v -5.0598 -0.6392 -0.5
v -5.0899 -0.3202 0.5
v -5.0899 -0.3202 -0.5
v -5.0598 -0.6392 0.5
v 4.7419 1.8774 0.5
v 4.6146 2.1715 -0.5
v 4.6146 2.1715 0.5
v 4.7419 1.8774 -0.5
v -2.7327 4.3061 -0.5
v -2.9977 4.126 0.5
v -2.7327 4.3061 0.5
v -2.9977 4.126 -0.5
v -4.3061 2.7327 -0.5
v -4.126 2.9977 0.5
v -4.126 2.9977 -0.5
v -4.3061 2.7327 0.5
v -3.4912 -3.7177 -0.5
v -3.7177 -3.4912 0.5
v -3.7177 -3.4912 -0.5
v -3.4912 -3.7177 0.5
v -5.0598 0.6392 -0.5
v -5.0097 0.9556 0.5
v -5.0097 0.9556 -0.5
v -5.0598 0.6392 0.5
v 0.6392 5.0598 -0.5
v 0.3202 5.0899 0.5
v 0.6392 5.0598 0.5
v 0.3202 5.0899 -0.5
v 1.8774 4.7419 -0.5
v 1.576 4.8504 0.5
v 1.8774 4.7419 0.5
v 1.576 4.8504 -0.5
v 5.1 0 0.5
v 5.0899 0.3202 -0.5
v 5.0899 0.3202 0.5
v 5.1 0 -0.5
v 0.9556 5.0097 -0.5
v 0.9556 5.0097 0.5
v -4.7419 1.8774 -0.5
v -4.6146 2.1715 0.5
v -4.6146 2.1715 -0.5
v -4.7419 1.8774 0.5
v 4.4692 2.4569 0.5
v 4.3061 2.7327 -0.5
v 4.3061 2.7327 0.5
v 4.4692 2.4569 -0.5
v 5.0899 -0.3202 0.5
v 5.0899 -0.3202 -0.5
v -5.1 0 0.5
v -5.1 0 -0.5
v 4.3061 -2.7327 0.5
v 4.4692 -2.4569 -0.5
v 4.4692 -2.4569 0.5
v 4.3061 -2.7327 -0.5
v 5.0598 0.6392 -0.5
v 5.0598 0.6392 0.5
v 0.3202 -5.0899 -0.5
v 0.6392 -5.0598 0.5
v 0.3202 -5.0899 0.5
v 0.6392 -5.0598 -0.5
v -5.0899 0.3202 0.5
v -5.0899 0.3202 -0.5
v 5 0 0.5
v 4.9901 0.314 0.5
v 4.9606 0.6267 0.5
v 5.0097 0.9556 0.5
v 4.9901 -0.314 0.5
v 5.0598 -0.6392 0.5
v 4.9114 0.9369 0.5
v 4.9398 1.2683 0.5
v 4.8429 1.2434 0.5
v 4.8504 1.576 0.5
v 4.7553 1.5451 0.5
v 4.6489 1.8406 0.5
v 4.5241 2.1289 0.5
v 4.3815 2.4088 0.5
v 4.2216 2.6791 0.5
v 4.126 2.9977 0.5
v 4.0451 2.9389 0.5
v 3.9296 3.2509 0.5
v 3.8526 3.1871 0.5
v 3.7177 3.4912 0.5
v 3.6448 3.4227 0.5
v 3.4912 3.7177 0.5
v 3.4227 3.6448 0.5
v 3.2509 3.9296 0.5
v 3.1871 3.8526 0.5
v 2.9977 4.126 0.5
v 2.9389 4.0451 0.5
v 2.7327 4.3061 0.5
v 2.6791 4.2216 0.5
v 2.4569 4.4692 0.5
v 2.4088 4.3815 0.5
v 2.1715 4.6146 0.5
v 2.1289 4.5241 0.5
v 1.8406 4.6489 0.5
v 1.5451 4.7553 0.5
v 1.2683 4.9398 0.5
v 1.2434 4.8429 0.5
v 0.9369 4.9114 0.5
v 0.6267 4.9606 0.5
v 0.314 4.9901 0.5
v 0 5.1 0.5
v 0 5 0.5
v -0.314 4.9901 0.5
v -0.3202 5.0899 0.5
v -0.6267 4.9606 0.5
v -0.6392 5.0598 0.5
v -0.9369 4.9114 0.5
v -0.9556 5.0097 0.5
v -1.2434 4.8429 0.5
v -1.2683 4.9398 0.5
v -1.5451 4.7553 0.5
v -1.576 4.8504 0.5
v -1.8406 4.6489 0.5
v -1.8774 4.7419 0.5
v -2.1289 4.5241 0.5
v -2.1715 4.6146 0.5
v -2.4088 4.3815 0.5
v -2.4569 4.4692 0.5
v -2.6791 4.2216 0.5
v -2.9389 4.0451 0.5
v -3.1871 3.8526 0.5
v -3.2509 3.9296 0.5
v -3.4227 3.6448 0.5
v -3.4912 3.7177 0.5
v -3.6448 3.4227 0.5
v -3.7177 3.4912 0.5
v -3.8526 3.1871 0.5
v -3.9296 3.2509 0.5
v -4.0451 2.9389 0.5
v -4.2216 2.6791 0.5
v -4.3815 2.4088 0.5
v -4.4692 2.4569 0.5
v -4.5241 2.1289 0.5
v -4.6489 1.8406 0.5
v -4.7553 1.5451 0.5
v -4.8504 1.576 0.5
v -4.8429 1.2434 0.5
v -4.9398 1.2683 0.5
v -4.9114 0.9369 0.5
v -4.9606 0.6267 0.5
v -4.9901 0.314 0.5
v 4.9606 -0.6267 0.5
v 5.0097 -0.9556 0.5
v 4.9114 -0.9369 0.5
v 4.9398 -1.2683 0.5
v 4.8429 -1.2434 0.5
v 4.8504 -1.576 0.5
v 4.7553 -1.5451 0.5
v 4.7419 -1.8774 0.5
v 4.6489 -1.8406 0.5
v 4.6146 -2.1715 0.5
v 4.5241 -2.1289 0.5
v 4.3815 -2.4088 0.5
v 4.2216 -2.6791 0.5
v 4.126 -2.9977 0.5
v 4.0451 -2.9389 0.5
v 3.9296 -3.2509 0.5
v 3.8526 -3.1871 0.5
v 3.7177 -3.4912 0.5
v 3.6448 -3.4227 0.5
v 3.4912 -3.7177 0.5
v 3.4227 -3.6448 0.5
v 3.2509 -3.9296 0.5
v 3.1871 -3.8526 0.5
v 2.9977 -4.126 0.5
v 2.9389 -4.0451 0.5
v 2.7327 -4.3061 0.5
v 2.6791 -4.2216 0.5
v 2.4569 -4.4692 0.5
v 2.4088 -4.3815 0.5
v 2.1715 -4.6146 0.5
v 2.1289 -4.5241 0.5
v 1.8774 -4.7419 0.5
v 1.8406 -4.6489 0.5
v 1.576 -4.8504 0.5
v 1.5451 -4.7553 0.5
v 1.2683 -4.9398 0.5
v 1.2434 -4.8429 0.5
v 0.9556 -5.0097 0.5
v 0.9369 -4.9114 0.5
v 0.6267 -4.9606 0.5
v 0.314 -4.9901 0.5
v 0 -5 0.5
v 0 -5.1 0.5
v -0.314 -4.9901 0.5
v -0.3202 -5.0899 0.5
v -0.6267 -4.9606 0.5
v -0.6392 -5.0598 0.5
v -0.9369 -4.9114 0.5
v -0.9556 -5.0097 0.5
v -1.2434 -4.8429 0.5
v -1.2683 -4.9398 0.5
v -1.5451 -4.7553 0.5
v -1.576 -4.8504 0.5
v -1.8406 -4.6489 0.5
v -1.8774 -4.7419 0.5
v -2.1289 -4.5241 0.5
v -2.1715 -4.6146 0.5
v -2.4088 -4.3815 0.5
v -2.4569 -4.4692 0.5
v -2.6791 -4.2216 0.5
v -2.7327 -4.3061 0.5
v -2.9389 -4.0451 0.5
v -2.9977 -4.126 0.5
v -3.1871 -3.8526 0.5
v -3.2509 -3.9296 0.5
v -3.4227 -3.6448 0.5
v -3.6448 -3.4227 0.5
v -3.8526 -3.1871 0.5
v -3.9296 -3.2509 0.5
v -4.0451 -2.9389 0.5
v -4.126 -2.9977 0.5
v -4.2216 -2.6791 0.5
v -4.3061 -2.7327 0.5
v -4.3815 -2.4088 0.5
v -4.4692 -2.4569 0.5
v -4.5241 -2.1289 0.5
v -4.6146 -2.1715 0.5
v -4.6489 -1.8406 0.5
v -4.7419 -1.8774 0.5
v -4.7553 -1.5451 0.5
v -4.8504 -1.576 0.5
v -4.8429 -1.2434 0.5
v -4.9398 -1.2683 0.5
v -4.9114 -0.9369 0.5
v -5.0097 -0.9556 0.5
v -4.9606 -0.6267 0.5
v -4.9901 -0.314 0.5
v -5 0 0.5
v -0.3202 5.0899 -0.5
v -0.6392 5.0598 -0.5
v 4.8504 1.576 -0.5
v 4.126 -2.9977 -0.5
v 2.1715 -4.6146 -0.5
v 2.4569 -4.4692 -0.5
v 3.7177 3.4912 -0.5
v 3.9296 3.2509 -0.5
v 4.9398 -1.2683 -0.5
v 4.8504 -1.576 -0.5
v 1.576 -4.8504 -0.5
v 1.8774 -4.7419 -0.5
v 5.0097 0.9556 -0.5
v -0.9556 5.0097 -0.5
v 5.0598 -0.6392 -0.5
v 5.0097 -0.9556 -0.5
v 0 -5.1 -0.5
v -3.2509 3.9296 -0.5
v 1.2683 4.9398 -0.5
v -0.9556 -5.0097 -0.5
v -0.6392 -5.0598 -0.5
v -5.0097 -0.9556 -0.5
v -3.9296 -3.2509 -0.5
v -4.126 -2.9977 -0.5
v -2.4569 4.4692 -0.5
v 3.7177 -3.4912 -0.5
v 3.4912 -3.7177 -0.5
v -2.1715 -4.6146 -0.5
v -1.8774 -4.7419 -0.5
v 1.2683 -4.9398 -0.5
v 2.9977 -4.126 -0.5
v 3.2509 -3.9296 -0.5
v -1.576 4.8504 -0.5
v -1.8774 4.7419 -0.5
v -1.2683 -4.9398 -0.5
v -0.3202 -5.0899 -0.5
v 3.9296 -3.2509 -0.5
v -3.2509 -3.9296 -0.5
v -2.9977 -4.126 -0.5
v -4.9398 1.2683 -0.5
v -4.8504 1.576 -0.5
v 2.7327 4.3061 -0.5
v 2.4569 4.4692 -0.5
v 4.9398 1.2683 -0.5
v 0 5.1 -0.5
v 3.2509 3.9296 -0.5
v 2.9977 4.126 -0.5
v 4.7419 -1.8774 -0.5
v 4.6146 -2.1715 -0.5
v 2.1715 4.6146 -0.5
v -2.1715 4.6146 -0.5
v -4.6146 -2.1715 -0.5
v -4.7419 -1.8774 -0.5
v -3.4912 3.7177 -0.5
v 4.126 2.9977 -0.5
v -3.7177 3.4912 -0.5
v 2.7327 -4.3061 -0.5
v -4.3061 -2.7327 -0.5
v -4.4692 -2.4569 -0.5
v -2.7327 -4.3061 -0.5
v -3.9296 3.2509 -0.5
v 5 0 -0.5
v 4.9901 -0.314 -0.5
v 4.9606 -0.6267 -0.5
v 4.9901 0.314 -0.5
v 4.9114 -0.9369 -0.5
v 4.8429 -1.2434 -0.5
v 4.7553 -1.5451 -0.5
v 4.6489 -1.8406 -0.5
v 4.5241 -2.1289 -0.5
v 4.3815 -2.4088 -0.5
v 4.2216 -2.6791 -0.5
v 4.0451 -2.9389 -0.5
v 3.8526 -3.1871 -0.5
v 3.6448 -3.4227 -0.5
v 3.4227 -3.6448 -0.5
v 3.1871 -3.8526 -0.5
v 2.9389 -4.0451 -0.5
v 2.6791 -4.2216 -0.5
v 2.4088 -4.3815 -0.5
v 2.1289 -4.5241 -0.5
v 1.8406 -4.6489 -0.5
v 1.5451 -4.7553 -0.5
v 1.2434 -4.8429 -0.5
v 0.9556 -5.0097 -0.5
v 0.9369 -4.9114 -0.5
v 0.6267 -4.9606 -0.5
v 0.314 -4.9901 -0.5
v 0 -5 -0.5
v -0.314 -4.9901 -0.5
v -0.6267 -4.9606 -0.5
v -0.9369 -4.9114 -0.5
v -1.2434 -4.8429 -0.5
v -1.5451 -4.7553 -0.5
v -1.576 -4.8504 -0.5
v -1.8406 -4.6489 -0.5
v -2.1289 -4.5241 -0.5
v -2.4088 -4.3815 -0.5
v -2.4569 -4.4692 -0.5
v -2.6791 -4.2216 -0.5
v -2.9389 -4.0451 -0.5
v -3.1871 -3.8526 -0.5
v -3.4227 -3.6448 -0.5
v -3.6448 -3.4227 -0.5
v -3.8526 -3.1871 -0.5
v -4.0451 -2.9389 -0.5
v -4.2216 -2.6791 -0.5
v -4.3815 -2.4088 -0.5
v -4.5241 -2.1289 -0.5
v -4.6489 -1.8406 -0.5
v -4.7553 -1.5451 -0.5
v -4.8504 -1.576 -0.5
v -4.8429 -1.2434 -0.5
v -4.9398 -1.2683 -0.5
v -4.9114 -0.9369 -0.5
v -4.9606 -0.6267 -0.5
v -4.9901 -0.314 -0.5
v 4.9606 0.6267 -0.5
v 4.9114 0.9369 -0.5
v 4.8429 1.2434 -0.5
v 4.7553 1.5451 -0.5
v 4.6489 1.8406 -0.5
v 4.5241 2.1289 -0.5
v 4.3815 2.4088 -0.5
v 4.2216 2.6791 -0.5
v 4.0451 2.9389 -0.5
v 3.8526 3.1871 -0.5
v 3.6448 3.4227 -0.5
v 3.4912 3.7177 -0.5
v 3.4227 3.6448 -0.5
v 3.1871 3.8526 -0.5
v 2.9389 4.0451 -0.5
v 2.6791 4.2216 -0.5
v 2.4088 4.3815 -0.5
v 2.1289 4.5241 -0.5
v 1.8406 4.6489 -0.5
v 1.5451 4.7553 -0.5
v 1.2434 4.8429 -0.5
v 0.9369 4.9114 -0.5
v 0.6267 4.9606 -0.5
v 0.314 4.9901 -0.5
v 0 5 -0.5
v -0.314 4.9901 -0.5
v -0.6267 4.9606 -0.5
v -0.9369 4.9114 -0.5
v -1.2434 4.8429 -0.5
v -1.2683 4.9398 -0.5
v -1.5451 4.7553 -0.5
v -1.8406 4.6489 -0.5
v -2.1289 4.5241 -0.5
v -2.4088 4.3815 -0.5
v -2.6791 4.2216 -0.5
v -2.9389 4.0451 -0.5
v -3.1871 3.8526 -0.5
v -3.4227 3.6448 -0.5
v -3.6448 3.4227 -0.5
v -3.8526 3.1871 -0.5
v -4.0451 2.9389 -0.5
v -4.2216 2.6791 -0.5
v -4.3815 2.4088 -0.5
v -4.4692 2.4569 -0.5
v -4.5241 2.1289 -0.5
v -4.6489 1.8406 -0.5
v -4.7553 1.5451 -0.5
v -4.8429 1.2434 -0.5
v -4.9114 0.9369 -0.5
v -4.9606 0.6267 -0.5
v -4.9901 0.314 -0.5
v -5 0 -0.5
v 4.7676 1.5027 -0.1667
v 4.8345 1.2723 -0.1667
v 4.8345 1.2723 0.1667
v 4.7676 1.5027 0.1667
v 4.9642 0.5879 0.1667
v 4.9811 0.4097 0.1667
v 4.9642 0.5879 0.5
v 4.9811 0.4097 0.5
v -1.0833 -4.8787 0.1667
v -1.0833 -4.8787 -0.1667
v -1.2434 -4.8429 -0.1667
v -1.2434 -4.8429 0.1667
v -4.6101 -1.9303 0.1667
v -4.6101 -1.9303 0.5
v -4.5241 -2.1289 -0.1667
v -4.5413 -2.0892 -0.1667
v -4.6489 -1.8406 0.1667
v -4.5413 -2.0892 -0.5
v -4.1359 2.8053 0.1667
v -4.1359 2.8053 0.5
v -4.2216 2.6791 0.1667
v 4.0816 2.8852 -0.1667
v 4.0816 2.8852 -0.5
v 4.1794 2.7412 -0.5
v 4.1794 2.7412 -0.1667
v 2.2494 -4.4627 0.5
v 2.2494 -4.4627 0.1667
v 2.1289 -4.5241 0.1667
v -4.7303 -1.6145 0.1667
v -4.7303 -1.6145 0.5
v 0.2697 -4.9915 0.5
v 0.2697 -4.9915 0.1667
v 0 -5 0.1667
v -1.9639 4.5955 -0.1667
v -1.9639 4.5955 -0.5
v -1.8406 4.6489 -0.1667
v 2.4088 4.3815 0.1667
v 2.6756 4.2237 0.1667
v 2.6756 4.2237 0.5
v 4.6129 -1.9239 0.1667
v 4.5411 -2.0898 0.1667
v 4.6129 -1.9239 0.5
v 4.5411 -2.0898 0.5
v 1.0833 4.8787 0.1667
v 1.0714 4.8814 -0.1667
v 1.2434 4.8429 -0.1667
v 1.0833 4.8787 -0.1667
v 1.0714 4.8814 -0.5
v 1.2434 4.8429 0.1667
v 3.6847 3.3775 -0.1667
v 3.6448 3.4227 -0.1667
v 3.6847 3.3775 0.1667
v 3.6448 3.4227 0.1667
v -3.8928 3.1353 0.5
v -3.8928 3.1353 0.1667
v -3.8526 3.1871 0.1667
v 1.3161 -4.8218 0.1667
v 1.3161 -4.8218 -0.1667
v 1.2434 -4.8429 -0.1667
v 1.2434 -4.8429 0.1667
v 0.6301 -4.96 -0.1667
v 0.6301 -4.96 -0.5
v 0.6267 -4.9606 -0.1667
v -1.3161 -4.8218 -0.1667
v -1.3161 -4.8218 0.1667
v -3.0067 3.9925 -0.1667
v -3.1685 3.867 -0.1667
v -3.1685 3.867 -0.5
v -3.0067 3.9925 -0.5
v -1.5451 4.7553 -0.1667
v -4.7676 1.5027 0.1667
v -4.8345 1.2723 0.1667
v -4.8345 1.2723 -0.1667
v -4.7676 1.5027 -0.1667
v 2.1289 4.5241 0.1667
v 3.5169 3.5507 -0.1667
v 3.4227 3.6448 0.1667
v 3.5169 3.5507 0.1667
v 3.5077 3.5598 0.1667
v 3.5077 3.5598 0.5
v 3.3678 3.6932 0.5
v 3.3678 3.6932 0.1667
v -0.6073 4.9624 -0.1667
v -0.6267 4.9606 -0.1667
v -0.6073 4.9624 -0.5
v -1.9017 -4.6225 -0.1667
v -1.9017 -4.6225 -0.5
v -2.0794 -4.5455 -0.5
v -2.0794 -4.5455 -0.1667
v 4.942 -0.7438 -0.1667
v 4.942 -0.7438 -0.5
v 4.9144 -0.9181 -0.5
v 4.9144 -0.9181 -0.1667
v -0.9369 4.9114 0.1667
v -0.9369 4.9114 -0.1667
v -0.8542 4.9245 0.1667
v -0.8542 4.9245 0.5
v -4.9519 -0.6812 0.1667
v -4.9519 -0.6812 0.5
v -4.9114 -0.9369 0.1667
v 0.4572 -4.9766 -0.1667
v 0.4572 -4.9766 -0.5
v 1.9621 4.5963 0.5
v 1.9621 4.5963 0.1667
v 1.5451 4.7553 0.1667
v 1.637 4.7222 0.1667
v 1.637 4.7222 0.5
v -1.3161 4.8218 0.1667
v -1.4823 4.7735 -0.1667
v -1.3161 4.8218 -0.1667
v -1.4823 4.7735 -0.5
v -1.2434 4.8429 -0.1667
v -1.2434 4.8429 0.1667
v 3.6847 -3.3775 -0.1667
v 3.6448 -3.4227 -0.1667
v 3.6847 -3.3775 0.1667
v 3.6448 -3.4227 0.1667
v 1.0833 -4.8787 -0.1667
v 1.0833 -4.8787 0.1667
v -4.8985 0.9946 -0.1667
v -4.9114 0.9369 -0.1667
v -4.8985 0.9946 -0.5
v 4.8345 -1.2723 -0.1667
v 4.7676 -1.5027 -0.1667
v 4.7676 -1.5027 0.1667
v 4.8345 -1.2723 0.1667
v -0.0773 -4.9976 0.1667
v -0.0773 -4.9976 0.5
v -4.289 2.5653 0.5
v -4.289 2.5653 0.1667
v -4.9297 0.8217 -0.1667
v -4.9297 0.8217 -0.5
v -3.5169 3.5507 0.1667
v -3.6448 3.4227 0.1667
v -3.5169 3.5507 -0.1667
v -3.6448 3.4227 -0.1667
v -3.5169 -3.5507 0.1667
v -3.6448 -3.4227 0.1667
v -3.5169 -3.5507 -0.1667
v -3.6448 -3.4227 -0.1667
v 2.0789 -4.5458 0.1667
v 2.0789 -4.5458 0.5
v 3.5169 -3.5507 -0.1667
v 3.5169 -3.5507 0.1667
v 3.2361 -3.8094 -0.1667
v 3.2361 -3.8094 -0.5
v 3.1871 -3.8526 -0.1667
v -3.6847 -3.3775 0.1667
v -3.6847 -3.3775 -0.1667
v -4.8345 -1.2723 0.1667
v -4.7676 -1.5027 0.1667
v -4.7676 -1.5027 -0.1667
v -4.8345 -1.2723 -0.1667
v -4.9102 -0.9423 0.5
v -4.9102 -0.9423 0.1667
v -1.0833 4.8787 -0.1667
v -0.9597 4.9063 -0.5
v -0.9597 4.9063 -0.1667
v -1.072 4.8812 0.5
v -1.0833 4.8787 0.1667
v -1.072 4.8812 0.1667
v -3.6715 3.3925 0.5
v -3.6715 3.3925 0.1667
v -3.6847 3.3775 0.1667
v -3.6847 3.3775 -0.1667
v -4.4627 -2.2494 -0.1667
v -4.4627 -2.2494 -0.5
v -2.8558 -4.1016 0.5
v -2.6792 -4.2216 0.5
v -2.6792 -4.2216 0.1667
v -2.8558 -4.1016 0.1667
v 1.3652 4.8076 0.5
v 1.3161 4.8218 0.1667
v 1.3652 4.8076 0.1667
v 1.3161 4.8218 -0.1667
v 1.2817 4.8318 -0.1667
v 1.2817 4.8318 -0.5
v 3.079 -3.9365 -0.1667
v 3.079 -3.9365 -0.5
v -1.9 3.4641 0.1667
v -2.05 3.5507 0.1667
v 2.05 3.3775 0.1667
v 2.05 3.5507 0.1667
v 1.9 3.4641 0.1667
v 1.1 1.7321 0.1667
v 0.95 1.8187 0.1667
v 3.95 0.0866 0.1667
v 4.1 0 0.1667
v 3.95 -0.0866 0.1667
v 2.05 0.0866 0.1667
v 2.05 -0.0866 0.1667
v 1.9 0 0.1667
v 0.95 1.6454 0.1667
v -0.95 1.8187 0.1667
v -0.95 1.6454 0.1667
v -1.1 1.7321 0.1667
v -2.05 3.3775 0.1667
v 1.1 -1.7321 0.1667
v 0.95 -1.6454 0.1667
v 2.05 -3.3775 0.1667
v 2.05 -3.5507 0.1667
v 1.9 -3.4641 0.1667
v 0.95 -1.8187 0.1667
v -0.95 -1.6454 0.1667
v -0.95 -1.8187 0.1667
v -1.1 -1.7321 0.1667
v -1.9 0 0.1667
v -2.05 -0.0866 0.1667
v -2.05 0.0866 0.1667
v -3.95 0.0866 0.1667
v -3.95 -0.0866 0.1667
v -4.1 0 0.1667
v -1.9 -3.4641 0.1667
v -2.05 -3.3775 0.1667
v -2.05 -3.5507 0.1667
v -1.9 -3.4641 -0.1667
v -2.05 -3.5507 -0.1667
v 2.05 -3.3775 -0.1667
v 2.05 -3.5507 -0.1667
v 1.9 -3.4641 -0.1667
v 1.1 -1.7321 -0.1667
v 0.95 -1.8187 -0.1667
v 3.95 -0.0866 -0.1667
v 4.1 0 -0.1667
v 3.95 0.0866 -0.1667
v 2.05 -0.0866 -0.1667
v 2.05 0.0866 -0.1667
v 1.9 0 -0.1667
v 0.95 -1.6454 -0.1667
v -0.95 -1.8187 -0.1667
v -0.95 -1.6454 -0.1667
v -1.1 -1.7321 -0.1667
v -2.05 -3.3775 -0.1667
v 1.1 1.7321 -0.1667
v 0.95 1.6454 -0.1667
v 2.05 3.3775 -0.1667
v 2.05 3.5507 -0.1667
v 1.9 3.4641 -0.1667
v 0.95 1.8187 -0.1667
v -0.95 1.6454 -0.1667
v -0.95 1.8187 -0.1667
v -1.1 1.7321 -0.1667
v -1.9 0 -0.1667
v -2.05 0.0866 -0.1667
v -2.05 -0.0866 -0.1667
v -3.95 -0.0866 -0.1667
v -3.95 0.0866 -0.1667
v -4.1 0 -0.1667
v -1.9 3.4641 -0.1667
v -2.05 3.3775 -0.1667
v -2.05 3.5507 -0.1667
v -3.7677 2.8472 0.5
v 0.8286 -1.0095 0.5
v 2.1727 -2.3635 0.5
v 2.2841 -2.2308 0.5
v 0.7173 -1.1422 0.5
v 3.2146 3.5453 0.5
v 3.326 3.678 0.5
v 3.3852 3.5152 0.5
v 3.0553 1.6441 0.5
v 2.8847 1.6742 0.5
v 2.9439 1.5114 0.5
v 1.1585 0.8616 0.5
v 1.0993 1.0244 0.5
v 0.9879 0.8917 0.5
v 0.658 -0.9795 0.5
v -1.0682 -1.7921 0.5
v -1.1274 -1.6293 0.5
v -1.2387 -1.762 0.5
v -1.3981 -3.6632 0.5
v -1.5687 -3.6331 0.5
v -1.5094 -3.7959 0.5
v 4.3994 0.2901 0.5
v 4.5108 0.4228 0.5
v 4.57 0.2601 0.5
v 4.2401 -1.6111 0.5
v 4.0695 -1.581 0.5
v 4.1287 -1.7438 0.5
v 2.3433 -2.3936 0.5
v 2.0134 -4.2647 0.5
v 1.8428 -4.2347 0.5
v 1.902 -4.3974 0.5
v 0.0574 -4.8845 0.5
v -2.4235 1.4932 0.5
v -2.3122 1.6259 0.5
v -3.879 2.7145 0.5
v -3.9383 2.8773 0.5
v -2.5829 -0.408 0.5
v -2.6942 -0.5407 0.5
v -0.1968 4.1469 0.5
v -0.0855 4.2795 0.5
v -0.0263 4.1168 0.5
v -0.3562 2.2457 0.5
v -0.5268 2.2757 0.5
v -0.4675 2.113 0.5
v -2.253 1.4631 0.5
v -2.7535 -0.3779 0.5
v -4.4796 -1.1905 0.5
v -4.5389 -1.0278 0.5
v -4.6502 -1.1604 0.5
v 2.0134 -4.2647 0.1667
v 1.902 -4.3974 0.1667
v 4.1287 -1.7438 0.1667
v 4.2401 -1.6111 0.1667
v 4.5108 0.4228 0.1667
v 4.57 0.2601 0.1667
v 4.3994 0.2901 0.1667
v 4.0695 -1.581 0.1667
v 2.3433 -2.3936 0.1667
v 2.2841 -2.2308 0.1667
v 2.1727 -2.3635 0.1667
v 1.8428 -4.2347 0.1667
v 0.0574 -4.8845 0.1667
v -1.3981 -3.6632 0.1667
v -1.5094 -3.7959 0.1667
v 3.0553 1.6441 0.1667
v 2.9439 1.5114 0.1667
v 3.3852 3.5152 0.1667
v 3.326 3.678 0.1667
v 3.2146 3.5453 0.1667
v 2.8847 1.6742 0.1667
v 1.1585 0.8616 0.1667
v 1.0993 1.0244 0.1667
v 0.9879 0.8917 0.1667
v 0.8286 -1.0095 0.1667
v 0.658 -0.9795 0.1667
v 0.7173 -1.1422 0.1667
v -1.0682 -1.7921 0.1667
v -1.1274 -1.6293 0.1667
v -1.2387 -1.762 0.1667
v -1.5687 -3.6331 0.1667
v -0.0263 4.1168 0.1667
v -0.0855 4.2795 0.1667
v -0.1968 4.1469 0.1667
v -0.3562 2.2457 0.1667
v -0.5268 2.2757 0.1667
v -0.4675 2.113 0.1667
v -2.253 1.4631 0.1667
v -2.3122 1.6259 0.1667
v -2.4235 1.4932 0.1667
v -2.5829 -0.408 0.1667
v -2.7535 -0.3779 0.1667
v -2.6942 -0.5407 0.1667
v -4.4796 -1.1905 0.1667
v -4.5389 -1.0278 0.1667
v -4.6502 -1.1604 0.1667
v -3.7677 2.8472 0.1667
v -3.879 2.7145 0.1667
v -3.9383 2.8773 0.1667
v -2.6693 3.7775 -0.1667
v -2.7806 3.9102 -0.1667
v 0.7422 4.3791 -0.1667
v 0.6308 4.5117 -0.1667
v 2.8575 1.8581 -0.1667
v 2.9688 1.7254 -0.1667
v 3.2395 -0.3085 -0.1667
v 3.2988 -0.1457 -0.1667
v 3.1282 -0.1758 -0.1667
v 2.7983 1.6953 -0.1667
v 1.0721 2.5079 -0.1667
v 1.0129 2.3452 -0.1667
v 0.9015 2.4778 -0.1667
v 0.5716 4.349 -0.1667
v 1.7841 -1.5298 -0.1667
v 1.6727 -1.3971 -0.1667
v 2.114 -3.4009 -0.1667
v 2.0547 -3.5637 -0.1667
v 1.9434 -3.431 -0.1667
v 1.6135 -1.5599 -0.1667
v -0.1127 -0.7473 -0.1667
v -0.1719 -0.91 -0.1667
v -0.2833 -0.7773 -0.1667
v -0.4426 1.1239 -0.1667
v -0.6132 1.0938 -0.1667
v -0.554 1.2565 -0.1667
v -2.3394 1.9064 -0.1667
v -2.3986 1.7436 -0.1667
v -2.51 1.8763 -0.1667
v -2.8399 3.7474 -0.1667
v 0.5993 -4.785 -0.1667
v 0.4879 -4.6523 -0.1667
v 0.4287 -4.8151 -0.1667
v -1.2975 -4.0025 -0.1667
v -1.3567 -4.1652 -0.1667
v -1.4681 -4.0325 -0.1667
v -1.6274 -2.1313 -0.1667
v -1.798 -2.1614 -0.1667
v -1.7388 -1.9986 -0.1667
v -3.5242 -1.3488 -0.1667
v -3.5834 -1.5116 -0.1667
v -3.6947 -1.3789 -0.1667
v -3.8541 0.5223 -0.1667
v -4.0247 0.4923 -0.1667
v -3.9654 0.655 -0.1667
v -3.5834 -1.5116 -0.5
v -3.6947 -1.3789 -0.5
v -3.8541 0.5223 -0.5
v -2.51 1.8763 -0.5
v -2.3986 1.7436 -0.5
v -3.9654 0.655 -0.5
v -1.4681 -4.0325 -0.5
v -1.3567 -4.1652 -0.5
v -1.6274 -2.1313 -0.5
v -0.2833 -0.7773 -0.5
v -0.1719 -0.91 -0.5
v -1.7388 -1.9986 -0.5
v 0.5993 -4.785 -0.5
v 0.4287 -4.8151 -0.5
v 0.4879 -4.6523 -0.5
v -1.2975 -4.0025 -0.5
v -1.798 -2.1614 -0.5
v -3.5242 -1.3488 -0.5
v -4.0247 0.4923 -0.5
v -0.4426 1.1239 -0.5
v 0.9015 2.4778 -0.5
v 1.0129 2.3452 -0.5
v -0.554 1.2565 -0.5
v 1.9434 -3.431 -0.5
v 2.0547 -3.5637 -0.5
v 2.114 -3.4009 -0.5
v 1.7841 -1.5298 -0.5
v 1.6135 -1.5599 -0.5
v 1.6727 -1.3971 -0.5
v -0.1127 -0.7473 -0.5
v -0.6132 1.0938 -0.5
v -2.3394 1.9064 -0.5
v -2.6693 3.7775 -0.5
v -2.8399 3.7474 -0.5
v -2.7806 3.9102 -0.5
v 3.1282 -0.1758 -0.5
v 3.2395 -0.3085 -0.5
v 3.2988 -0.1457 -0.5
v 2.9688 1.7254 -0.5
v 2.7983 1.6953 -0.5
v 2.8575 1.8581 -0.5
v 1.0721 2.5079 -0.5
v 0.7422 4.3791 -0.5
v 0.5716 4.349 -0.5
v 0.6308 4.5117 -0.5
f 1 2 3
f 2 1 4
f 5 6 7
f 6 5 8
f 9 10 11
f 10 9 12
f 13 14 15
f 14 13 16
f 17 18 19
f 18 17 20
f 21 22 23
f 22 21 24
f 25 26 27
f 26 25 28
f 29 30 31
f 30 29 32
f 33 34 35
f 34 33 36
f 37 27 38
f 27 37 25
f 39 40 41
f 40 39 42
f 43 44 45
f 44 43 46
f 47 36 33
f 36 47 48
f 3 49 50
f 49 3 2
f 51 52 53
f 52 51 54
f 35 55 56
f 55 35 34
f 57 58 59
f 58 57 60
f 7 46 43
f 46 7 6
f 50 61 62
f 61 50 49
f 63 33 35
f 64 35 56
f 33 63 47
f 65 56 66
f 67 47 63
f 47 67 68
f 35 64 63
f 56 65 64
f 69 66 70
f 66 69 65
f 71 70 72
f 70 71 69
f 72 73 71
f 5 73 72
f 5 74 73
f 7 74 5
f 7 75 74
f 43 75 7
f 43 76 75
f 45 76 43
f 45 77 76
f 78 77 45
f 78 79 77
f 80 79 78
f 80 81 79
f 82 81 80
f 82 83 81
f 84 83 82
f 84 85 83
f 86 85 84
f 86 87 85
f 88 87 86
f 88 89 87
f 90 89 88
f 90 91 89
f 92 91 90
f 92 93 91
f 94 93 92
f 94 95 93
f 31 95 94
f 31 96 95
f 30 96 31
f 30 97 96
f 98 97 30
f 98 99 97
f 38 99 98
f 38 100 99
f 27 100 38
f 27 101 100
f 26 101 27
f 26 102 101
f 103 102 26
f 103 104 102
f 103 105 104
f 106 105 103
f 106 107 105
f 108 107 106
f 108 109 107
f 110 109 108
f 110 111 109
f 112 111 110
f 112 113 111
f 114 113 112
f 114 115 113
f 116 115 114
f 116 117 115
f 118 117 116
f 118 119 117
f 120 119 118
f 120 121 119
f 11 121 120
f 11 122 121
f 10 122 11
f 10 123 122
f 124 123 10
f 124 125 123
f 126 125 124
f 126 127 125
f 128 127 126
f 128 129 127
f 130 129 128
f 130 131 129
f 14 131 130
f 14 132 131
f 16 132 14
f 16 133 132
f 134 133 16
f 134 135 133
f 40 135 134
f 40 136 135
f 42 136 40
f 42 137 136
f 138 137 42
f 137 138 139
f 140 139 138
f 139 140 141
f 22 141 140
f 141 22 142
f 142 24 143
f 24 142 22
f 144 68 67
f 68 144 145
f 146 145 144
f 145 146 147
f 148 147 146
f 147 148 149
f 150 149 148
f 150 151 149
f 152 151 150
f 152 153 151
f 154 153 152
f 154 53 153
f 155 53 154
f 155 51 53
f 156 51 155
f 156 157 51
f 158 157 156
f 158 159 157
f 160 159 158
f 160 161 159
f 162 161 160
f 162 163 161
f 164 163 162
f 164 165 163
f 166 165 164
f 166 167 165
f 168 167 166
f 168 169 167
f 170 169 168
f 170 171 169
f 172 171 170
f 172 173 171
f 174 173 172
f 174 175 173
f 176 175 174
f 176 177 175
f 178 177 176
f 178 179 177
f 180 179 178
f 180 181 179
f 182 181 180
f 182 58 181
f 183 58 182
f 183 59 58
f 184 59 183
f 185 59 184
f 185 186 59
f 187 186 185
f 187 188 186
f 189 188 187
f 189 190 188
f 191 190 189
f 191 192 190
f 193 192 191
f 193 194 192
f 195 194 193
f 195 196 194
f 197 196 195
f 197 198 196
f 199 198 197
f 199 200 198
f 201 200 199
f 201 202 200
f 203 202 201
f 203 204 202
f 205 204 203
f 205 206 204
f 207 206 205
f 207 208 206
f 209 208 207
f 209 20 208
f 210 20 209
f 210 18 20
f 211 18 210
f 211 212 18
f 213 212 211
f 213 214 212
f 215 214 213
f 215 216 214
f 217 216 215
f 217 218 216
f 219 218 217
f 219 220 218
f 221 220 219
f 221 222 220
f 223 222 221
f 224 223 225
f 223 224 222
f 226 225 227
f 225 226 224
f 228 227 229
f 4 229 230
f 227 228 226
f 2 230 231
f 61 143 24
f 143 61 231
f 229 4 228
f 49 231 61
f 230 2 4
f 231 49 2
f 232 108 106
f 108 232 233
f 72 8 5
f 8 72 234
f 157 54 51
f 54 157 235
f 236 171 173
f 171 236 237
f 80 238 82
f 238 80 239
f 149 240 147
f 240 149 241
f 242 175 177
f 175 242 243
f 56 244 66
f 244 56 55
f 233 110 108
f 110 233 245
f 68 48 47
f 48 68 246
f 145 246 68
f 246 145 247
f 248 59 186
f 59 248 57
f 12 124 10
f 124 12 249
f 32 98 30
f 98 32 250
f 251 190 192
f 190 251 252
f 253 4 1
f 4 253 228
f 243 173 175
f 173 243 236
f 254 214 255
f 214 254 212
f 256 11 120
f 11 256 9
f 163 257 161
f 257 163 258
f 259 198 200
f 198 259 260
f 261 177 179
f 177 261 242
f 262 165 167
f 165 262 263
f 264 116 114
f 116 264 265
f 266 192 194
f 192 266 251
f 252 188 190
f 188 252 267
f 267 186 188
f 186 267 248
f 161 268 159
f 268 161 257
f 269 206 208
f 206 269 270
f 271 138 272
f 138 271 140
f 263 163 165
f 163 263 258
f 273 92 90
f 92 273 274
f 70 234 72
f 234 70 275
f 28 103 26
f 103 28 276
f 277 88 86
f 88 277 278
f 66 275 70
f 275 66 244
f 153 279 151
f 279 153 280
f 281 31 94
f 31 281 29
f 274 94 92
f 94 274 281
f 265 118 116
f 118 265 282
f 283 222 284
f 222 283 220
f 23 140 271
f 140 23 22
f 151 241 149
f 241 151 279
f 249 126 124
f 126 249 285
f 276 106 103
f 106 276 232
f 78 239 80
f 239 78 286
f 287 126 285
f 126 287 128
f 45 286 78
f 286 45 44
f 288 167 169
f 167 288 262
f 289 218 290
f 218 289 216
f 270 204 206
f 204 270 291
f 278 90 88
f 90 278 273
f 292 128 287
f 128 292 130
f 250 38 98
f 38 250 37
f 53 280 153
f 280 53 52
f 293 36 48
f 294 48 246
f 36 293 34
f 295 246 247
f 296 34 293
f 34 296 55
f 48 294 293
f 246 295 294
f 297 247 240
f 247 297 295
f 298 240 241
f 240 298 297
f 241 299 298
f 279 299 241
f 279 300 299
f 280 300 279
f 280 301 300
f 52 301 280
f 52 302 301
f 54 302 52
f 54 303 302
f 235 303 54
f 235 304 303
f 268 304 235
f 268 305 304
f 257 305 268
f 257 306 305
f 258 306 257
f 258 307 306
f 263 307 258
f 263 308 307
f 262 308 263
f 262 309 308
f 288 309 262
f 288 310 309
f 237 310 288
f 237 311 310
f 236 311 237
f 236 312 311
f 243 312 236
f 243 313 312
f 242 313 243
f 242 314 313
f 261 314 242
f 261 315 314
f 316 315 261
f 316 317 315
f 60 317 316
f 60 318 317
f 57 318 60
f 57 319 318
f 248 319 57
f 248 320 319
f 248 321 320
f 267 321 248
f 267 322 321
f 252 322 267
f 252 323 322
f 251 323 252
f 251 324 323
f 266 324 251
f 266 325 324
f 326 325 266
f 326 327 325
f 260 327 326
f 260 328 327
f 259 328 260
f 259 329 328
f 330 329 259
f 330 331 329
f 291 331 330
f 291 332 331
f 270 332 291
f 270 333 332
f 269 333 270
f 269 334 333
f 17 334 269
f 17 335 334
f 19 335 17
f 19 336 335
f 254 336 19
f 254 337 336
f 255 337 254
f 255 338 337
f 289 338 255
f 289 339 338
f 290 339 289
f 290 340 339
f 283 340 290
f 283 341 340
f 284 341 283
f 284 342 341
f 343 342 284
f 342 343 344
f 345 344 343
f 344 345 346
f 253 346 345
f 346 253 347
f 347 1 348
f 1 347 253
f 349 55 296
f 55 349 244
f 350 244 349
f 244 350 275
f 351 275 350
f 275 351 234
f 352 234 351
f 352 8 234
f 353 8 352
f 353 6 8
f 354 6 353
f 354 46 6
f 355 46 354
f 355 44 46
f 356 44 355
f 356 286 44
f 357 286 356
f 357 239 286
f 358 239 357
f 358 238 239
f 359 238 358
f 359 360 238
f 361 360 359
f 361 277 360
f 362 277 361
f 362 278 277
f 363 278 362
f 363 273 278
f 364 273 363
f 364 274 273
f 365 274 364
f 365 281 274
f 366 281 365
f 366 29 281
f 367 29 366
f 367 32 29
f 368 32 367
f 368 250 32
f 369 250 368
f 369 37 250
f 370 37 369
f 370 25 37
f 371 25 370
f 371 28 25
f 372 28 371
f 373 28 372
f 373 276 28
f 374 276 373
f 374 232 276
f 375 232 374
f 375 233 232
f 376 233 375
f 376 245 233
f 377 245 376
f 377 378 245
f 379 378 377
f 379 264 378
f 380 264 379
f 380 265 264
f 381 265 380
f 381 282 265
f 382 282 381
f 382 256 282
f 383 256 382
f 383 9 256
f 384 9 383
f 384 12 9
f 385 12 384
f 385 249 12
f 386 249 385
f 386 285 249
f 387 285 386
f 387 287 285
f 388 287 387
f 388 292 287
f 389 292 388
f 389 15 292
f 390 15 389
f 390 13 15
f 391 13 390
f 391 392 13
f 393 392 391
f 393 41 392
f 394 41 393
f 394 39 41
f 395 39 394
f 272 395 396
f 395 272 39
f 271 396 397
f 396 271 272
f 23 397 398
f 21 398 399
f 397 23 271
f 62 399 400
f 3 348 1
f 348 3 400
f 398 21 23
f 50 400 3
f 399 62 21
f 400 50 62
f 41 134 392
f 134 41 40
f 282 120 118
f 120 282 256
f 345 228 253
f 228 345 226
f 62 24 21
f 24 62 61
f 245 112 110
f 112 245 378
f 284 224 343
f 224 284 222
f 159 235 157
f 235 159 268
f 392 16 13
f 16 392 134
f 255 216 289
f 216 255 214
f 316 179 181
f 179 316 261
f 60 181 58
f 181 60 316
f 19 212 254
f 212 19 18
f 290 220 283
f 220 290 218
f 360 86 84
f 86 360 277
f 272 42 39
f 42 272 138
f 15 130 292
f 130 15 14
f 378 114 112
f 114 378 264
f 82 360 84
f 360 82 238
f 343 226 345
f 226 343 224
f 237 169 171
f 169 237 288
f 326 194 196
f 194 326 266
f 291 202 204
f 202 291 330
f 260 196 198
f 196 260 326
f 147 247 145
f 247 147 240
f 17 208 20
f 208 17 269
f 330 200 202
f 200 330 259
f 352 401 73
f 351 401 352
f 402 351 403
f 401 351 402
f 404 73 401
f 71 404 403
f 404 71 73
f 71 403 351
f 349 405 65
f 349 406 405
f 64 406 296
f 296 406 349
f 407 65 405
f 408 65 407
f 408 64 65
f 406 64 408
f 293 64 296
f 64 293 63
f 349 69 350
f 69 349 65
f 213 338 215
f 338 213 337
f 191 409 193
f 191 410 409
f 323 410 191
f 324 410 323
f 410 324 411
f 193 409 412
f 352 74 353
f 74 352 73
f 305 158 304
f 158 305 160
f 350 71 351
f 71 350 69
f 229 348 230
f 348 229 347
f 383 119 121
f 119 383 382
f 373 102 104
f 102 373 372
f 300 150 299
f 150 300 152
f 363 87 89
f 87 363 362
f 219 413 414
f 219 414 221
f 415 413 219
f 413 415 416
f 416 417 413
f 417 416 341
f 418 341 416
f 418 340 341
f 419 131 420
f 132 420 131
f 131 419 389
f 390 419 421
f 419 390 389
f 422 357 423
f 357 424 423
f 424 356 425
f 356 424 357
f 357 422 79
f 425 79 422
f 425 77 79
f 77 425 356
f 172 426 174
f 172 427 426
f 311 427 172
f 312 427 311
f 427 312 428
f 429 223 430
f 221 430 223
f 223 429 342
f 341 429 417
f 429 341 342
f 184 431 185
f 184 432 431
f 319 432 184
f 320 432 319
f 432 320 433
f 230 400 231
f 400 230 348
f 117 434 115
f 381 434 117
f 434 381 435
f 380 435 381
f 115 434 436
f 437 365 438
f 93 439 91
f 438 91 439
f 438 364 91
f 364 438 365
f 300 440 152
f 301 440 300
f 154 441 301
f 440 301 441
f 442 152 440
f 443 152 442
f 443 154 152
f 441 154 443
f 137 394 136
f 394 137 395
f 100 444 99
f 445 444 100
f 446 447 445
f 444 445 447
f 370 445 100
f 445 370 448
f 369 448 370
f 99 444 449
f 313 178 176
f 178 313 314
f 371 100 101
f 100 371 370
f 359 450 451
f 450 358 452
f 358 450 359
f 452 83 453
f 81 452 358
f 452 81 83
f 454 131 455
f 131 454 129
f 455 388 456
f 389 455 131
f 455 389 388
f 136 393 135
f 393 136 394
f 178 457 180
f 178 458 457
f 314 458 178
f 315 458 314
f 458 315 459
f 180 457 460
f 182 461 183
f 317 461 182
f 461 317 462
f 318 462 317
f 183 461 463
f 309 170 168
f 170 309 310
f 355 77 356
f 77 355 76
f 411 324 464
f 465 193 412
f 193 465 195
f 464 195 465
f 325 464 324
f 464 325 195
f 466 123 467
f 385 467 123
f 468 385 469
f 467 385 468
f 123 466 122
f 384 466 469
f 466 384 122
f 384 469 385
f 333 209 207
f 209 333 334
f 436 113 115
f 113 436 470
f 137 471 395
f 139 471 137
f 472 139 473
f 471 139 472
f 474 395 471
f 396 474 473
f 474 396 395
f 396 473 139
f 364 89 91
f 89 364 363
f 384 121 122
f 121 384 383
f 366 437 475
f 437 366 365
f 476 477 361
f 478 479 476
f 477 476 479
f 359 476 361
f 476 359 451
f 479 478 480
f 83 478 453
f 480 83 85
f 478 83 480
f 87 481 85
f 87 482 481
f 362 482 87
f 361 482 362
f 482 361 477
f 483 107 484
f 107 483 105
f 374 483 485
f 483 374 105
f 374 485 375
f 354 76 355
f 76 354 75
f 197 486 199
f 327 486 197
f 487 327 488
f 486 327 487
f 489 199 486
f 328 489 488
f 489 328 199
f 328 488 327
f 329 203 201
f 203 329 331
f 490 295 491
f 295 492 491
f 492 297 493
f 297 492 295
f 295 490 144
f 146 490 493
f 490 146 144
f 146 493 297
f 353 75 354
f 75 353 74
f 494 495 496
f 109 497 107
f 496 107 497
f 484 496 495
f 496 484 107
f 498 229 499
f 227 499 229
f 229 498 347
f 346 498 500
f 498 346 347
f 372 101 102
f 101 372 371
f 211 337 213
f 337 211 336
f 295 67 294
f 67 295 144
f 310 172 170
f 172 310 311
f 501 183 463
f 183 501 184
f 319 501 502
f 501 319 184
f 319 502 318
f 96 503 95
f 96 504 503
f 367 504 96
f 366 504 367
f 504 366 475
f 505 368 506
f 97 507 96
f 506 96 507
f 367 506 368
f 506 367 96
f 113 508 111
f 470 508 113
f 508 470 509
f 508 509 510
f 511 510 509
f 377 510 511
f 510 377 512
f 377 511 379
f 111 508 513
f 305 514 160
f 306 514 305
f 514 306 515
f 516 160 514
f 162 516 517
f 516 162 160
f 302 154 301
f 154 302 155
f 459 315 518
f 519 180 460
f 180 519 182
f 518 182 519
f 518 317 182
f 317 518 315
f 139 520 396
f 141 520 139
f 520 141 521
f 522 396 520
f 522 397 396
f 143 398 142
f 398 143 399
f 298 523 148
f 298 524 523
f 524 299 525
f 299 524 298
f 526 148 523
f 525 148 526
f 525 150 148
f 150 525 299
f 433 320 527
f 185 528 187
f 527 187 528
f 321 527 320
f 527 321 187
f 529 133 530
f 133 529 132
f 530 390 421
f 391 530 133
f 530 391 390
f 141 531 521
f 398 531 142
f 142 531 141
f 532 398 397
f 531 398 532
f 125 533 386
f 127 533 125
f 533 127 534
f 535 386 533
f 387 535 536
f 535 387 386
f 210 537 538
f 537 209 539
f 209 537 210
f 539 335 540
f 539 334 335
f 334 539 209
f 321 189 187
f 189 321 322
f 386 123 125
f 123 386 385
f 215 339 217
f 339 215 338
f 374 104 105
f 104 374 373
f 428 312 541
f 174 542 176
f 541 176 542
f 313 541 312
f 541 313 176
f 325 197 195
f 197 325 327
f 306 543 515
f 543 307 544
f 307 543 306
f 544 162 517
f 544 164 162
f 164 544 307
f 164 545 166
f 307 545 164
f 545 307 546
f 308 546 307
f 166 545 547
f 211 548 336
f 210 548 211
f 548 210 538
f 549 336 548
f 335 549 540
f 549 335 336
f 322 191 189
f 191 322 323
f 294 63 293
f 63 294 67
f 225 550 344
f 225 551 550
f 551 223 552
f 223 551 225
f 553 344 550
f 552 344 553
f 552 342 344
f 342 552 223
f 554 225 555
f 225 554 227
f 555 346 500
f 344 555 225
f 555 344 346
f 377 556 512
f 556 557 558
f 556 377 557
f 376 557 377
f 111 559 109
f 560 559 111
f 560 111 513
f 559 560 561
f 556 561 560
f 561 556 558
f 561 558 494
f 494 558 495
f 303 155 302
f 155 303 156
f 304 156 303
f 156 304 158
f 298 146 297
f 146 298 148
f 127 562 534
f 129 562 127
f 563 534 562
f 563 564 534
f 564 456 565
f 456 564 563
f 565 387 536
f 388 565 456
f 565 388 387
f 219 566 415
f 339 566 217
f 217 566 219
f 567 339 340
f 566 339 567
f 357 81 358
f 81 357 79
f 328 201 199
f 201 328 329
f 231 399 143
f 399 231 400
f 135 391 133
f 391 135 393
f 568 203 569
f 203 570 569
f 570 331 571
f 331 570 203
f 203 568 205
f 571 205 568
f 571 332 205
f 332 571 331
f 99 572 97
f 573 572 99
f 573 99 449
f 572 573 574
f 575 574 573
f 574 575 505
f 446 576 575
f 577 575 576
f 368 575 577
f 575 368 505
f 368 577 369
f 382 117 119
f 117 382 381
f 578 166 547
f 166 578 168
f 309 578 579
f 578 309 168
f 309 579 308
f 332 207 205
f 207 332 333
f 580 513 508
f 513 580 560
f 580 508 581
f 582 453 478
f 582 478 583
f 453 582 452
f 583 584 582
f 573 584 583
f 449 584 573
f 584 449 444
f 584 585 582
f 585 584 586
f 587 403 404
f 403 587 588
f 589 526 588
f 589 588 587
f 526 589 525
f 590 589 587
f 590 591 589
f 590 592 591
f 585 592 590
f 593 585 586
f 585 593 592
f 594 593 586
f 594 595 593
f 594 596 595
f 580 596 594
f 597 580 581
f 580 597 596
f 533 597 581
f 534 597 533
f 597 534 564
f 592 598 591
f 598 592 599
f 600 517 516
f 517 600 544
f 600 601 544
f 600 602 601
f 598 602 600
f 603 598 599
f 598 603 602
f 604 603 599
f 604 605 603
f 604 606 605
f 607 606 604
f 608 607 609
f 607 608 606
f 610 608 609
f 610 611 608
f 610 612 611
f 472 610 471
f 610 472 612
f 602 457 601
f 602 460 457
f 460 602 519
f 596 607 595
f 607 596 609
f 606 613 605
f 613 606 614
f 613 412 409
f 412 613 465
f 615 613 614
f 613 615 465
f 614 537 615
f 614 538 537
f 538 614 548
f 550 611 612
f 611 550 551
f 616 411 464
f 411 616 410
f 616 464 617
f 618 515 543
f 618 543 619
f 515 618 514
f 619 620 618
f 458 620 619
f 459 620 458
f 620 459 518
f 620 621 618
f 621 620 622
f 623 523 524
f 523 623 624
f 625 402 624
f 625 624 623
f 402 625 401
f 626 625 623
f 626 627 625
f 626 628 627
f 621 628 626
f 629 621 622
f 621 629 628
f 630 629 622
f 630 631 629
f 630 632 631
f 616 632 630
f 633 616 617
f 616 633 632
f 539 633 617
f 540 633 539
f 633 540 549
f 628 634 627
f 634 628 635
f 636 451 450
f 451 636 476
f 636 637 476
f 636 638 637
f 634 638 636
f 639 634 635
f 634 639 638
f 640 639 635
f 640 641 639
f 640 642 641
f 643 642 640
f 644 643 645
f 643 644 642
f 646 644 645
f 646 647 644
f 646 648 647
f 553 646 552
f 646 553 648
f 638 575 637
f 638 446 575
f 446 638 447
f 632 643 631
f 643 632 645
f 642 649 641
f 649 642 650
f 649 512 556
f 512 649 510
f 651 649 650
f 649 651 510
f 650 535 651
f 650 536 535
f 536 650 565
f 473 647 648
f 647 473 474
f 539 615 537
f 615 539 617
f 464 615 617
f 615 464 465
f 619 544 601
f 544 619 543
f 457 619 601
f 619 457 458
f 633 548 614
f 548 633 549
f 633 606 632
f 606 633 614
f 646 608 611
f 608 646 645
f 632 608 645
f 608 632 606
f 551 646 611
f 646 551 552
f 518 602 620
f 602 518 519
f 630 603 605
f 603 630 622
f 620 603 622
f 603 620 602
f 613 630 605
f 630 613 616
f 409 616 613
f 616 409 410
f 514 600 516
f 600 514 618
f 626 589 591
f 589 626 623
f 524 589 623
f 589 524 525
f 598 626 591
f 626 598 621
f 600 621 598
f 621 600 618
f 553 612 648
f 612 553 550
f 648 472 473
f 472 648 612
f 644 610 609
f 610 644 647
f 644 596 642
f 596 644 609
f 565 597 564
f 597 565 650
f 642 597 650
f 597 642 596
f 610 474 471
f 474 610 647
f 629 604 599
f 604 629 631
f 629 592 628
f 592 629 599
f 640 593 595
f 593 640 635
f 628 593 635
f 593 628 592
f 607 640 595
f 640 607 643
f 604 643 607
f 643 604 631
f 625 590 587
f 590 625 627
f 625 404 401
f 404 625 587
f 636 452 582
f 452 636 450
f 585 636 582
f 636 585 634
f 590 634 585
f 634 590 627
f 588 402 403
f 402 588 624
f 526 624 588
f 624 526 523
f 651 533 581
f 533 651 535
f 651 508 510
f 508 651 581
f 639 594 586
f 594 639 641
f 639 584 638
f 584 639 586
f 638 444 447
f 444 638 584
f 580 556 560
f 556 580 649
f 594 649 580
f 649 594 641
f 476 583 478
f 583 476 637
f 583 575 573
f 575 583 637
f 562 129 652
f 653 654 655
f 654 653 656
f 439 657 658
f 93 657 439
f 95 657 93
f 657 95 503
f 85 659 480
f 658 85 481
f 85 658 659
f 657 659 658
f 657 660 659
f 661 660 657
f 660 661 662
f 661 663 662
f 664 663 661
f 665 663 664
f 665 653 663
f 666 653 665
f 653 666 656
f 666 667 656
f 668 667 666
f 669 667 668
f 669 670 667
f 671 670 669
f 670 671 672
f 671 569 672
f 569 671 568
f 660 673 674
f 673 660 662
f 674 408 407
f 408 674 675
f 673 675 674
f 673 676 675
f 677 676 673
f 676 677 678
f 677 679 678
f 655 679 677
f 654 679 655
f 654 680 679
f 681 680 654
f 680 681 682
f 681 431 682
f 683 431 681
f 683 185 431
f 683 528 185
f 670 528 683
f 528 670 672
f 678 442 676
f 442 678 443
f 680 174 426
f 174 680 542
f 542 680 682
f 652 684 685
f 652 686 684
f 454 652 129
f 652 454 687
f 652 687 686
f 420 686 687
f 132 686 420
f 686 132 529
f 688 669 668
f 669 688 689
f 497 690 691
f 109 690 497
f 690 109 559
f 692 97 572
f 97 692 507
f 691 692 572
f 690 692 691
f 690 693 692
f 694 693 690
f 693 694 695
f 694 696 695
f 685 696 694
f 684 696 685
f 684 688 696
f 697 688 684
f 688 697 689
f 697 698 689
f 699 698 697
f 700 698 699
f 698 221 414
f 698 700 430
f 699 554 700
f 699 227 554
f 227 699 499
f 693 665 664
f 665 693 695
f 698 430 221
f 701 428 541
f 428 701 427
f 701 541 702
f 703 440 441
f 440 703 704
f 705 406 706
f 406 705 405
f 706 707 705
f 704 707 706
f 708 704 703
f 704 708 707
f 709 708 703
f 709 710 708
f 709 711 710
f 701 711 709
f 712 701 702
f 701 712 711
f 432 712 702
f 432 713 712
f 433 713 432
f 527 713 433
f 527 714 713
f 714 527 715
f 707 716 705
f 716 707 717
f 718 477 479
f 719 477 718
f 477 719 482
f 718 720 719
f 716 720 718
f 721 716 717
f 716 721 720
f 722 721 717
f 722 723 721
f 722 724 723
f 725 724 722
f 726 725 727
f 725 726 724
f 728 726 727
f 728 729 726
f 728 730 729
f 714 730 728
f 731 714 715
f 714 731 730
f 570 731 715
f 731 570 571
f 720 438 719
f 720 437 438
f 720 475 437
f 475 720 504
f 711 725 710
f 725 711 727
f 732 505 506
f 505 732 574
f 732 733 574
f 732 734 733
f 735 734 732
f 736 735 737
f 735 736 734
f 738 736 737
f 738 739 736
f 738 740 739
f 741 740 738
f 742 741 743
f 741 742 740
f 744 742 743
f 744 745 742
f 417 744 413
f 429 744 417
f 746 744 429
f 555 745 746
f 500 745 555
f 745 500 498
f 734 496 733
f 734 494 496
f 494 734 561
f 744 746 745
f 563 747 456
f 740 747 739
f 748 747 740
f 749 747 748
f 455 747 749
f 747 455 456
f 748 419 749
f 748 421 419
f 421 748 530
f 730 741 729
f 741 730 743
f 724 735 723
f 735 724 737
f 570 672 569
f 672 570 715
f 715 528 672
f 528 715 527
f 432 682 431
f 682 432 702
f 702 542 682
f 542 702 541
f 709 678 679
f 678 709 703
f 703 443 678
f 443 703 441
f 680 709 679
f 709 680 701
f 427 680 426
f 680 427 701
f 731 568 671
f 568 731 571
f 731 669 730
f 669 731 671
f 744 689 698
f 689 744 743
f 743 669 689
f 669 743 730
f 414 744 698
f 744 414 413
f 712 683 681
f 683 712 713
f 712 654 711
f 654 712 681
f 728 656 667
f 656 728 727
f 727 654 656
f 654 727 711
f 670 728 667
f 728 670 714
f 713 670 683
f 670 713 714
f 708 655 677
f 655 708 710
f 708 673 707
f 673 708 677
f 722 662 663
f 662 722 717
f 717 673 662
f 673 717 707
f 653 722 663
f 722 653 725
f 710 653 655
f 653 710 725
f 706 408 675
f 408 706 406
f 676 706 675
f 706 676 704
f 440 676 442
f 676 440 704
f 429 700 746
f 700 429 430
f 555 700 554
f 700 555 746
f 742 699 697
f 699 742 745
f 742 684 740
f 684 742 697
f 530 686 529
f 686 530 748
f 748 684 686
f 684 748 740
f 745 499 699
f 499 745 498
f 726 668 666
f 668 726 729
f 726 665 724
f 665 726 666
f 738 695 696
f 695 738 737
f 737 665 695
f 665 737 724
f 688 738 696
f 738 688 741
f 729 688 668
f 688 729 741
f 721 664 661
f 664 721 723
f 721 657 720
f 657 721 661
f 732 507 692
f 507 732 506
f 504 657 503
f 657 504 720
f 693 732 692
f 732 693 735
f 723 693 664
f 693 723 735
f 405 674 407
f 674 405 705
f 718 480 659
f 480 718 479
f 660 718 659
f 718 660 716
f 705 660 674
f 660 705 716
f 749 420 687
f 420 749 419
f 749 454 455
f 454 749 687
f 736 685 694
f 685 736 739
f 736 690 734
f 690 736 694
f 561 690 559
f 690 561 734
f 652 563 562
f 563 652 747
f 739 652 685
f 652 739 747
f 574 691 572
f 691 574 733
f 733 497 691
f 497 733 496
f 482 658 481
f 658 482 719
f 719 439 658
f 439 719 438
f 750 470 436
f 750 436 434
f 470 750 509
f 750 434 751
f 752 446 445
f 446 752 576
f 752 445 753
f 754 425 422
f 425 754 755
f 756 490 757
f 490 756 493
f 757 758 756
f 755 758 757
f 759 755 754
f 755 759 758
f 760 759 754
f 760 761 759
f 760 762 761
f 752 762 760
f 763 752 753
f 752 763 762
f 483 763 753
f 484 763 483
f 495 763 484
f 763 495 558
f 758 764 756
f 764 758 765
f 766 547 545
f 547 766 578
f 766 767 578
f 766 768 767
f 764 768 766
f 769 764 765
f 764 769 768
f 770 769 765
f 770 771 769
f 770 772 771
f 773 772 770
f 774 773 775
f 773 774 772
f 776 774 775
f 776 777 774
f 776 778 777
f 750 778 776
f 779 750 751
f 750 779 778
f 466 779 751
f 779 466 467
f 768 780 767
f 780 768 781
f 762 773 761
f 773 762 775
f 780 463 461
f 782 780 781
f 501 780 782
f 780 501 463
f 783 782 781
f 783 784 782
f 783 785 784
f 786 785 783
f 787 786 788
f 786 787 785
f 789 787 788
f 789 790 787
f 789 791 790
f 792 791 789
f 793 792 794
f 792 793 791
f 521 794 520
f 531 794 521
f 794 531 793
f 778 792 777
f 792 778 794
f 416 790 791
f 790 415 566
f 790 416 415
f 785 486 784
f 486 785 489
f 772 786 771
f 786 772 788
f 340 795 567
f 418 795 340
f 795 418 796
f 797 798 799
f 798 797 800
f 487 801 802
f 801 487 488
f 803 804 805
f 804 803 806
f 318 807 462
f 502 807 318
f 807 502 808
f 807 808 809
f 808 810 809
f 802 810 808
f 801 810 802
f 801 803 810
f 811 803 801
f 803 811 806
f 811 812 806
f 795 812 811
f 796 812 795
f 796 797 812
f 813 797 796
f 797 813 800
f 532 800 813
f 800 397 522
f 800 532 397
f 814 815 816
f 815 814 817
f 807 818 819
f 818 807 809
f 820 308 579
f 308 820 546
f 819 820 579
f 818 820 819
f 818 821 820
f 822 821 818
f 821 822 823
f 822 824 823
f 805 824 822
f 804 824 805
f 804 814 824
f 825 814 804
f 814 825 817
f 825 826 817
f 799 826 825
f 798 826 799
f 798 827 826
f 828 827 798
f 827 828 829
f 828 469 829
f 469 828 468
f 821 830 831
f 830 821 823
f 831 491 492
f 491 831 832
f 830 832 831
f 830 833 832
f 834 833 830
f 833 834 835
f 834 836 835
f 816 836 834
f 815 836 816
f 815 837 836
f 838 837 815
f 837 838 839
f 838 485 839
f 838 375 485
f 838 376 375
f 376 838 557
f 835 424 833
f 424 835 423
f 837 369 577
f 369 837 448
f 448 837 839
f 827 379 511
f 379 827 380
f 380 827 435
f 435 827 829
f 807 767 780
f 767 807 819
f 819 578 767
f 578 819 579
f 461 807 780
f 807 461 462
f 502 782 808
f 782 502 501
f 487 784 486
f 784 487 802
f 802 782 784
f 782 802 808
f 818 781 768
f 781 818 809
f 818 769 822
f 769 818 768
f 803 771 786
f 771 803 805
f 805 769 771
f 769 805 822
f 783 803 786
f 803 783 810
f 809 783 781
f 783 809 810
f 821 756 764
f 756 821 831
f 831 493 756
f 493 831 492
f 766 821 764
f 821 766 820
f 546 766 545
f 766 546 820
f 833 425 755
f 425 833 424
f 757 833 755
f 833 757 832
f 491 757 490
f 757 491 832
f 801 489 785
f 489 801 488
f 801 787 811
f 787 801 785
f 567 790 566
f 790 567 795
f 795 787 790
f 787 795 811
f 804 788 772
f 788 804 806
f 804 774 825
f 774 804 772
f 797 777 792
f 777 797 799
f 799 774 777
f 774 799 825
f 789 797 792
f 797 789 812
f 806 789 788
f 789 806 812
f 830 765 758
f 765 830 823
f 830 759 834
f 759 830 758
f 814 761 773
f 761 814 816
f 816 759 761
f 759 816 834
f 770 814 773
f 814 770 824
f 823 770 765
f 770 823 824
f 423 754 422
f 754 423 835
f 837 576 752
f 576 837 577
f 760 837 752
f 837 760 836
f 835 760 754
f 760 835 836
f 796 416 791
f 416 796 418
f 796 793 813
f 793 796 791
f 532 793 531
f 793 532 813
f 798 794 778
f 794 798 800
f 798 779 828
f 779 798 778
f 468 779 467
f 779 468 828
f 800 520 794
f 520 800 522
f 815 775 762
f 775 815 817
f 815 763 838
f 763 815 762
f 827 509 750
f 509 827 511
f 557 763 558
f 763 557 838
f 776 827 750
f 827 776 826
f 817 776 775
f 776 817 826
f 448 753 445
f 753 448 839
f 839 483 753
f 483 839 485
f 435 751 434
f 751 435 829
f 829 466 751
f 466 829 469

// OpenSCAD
/*
Parameters
- wall radius
- wall height
- hexagon radius
- hexagon width
*/

wall_radius = 5;
wall_height = 1;
hexagon_radius = 2;
hexagon_width = 0.2;


wall_width = wall_radius / 50;
eps = 1e-3;
FN = 100;   // number of parts


module hexagon(height, center) {
    outer_radius = hexagon_radius + hexagon_width / 2;
    inner_radius = hexagon_radius - hexagon_width / 2;
    
    translate(center) {
        difference() {
            cylinder(
                h=height,
                r1=outer_radius,
                r2=outer_radius,
                center=true,
                $fn=6   
            );
            cylinder(
                h=height+eps,
                r1=inner_radius,
                r2=inner_radius,
                center=true,
                $fn=6   
            );
        };
    };
}

/*
Let's place the origin at (0,0,0).
The entire tiling can be translated + rotated later
*/
module hexagon_tiling_excess(height) {
    inner_hex_radius = hexagon_radius * sqrt(3) / 2;
    y_max = wall_radius + 2 * hexagon_radius;
    i_max = ceil(y_max / (2 * hexagon_radius));
    
    // some crazy ass math that probably could 
    // be reformatted to be more understandable
    for (yi = [-i_max : 1 : i_max]) {
        y = yi * 2 * inner_hex_radius;
        for (xi = [-i_max : 1 : i_max]) {
            x = xi * 3 * hexagon_radius;
            hexagon(height, [x, y, 0]);
            hexagon(height, [
                x+3/2*hexagon_radius, 
                y+inner_hex_radius, 
                0
            ]);
        }
    }
}

module hexagon_tiling(height, origin, rot) {
    intersection() {
        inner_cylinder();
        rotate(a=rot, v=[0,0,1]) {
            translate(origin) {
                hexagon_tiling_excess(height);
            };
        };
    }
}

module outer_cylinder()
{
    cylinder(
        h=wall_height,
        r1=wall_radius + wall_width,
        r2=wall_radius + wall_width,
        center=true,
        $fn=FN
    );
}

module inner_cylinder()
{
    cylinder(
        h=wall_height+eps,
        r1=wall_radius,
        r2=wall_radius,
        center=true,
        $fn=FN
    );
}

module cylinder_wall()
{
    difference() {
        outer_cylinder();
        inner_cylinder();
    }
}


/*
Put everything together now and clap your hands!
*/
module yeet() 
{
    cylinder_wall();
    cyl_height = wall_height / 3;
    O_mid = [0,0,0];
    O_low = [-hexagon_radius/3, hexagon_radius/4, cyl_height];
    O_high = [2*hexagon_radius/3, -hexagon_radius/4, -cyl_height];
    hexagon_tiling(cyl_height, O_mid, 0);
    hexagon_tiling(cyl_height, O_low, 20);
    hexagon_tiling(cyl_height, O_high, 40);
}
yeet();
